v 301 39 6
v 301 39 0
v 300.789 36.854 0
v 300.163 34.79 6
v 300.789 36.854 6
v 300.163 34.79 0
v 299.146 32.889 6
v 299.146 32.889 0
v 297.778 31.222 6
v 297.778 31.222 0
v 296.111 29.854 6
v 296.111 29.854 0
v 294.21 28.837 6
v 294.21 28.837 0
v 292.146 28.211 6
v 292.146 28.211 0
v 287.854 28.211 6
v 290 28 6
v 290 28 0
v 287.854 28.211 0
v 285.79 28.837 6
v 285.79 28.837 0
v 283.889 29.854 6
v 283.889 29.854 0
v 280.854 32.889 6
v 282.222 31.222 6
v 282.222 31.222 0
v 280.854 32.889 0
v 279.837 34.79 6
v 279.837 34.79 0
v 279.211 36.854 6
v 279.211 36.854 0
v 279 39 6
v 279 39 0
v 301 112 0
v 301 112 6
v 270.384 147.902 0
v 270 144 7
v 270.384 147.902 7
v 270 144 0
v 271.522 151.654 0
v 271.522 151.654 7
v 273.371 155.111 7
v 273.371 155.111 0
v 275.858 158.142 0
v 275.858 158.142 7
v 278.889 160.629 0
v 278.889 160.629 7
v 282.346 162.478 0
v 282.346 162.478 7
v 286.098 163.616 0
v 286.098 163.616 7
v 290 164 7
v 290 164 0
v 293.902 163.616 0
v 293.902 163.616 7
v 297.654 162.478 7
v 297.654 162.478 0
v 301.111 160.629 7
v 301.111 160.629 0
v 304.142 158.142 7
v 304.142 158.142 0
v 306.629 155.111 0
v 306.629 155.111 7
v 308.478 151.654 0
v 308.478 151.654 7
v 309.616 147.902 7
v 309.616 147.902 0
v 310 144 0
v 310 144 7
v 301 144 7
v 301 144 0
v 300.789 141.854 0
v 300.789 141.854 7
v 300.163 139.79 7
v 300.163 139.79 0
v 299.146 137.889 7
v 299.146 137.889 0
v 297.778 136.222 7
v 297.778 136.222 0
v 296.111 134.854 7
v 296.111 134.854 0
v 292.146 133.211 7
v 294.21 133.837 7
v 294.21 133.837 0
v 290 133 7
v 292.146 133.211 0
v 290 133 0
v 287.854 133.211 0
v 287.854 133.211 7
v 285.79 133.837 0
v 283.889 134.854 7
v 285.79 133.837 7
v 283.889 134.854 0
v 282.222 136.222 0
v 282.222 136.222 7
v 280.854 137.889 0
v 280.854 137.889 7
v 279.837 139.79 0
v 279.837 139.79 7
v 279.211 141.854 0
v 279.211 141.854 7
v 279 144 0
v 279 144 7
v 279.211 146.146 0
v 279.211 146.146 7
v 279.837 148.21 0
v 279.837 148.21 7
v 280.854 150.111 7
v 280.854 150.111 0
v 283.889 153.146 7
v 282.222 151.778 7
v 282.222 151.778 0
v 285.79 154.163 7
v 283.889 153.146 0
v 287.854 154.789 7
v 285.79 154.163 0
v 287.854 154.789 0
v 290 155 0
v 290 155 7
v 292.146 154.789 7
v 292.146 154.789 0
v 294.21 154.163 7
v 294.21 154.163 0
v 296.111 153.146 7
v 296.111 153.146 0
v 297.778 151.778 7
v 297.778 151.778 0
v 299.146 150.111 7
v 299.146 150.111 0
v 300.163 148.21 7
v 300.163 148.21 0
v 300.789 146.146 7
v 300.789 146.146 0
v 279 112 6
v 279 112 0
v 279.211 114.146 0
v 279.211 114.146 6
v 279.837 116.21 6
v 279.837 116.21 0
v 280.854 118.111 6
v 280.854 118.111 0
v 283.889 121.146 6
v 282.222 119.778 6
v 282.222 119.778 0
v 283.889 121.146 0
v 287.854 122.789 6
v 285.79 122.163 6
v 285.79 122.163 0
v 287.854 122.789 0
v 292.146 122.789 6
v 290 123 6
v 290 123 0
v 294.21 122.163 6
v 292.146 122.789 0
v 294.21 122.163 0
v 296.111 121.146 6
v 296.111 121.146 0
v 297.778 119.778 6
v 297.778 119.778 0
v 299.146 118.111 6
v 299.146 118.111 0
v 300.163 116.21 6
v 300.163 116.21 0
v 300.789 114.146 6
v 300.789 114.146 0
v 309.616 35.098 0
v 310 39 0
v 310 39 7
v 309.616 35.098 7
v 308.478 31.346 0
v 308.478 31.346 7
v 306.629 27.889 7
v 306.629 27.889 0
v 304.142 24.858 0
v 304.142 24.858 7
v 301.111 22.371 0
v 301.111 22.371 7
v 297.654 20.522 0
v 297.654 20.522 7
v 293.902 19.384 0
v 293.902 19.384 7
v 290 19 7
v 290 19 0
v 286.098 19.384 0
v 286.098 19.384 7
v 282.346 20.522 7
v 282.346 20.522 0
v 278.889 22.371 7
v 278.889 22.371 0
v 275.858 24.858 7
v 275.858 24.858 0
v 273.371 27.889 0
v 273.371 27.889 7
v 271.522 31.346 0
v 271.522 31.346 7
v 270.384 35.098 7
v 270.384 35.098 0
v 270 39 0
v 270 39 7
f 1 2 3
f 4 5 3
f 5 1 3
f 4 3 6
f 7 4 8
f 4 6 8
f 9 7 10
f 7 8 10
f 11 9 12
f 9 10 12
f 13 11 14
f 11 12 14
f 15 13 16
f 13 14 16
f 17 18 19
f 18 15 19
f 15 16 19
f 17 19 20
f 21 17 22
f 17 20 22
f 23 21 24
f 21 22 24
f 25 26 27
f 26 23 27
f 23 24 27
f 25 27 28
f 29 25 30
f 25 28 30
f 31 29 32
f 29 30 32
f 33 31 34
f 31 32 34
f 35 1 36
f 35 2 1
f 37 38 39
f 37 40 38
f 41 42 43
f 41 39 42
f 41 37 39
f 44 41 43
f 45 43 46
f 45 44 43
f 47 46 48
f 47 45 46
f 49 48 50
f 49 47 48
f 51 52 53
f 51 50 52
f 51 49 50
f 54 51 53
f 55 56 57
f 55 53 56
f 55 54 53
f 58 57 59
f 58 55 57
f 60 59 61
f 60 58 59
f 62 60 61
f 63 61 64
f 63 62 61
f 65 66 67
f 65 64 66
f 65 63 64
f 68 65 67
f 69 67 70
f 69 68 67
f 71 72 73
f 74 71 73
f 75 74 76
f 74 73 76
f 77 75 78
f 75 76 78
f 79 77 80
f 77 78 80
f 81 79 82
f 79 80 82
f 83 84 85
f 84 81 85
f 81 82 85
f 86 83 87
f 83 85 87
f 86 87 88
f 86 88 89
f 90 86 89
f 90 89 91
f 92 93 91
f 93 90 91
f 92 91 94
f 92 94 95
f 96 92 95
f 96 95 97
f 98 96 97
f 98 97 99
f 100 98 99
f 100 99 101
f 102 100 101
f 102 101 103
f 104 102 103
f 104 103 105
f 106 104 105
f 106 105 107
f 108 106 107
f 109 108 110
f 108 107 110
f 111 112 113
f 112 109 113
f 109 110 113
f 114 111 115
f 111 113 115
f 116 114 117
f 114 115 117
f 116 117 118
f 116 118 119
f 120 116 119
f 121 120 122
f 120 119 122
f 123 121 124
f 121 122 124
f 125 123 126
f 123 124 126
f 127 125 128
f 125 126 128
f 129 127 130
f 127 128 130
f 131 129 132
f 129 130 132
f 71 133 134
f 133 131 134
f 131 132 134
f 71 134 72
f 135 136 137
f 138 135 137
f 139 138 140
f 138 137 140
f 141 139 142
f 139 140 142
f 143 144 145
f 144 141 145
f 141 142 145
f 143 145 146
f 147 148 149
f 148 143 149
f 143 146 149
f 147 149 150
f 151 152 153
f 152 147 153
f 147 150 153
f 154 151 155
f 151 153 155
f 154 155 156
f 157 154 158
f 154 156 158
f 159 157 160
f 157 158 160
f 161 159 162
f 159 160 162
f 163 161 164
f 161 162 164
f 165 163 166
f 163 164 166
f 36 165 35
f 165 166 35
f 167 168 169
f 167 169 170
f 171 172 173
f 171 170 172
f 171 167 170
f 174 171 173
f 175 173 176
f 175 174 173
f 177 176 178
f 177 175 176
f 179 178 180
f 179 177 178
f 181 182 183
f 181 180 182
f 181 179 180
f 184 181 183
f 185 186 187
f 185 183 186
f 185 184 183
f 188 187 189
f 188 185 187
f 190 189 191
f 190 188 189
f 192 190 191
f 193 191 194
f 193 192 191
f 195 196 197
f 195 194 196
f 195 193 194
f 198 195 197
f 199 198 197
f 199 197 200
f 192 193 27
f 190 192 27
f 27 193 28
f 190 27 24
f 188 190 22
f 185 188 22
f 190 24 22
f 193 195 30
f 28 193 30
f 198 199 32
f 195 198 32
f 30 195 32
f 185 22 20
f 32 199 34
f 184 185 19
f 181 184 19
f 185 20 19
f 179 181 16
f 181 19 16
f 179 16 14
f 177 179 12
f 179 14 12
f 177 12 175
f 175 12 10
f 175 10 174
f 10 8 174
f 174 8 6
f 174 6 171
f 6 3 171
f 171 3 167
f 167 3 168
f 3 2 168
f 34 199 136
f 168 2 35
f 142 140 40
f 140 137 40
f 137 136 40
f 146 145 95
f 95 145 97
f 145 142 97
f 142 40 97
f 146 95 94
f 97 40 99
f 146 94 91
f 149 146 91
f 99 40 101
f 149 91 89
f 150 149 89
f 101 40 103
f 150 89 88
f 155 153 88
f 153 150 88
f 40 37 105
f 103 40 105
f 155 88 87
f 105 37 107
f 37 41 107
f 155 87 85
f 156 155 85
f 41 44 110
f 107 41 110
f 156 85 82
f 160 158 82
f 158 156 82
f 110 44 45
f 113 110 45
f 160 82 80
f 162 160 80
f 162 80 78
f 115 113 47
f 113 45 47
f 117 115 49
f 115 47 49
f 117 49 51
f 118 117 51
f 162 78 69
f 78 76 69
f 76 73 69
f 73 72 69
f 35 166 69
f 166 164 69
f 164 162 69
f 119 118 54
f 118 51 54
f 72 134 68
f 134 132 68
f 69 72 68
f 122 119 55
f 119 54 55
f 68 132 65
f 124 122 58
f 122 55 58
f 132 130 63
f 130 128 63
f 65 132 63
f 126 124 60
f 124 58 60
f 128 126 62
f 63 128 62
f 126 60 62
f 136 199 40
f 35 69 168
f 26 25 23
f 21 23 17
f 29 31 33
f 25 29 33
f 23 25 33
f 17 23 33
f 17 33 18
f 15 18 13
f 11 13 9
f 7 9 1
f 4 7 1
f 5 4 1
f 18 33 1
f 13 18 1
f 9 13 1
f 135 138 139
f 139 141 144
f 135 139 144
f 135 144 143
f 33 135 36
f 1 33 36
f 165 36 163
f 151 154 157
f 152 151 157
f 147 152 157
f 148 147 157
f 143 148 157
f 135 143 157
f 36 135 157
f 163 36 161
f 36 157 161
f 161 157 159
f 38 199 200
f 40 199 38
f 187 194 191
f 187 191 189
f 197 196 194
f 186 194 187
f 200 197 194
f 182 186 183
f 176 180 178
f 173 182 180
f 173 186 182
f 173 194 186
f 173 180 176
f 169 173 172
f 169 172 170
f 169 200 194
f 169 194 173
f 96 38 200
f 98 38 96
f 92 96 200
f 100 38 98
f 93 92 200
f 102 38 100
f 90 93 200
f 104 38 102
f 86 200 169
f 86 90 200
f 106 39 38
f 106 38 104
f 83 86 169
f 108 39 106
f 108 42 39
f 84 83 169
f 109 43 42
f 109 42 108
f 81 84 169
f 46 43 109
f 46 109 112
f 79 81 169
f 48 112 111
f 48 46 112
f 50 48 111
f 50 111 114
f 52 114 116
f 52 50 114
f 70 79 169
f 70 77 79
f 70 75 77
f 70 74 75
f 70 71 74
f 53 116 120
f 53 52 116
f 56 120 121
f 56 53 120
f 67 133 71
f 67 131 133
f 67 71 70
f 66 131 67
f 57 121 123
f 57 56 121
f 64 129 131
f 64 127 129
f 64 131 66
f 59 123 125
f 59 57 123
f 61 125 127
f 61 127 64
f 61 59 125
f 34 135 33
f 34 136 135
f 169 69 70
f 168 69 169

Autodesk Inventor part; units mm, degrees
ref_plane "YZ Plane" through (0, 0, 0) normal (1, 0, 0) x (0, 1, 0)
ref_plane "XZ Plane" through (0, 0, 0) normal (0, 1, 0) x (-1, 0, 0)
ref_plane "XY Plane" through (0, 0, 0) normal (0, 0, 1) x (1, 0, 0)
sketch "Sketch1" plane through (0, 0, 0) normal (0, 0, 1) x (1, 0, 0)
  line L0 (0, 0) -> (220, 0) construction
  line L1 (220, 0) -> (220, 9) construction
  line L2 (220, 9) -> (0, 9) construction
  line L3 (0, 9) -> (0, 0) construction
  line L4 (0, 9) -> (90.94, 295.0593) construction
  line L5 (129.06, 295.0593) -> (220, 9) construction
  circle A0 centre (110, 289) radius 11 construction
  line L6 (96.1101, 281.616) -> (103.5522, 305.0259) construction
  arc A1 (129.06, 295.0593) -> (90.94, 295.0593) centre (110, 289) ccw construction
  line L7 (99, 275.5567) -> (99, 269.1274) construction
  line L8 (110, 289) -> (110, 144) construction
  line L9 (130, 289) -> (130, 144) construction
  line L10 (90, 144) -> (90, 289) construction
  arc A2 (130, 289) -> (90, 289) centre (110, 289) ccw construction
  arc A3 (90, 144) -> (130, 144) centre (110, 144) ccw construction
  line L11 (290, 144) -> (290, 249) construction
  line L12 (310, 144) -> (310, 249) construction
  line L13 (270, 249) -> (270, 144) construction
  arc A4 (270, 144) -> (310, 144) centre (290, 144) ccw construction
  arc A5 (310, 249) -> (270, 249) centre (290, 249) ccw construction
  arc A6 (90, 289) -> (130, 289) centre (110, 289) ccw construction
  line L14 (98.9216, 269) -> (121.0784, 269) construction
  line L15 (209.0249, 269) -> (370.9751, 269) construction
  line L16 (209.0249, 144) -> (370.9751, 144) construction
  line L17 (290, 144) -> (290, 39) construction
  line L18 (310, 144) -> (310, 39)
  line L19 (270, 39) -> (270, 144)
  arc A7 (310, 144) -> (270, 144) centre (290, 144) ccw
  arc A8 (270, 39) -> (310, 39) centre (290, 39) ccw
  line L20 (209.0249, 19) -> (370.9751, 19) construction
  circle A9 centre (110, 289) radius 11 construction
  circle A10 centre (110, 144) radius 11 construction
  circle A11 centre (290, 144) radius 11
  circle A12 centre (290, 39) radius 11
  line L21 (290, 39) -> (290, 112) construction
  line L22 (301, 39) -> (301, 112)
  line L23 (279, 112) -> (279, 39)
  arc A13 (279, 39) -> (301, 39) centre (290, 39) ccw
  arc A14 (301, 112) -> (279, 112) centre (290, 112) ccw
  line L24 (290, 123) -> (290, 133) construction
  point P0 (110, 0)
  point P1 (110, 216.5)
  point P2 (110, 309)
  point P3 (290, 196.5)
  point P4 (110, 269)
  point P5 (110, 269)
  point P6 (290, 269)
  point P7 (290, 75.5)
  dimension "d18" = 22
  dimension "d0" = 9
  dimension "d1" = 220
  dimension "d2" = 22
  dimension "d3" = 280
  dimension "d4" = 9
  dimension "d7" = 40
  dimension "d8" = 40
  dimension "pendgap" = 0
  dimension "abovethefloor" = 10
  dimension "d11" = 105
  dimension "d12" = 145
  dimension "d14" = 22
  dimension "d19" = 22
  dimension "d20" = 50
  dimension "d23" = 10
extrude "Extrusion3" add sketch "Sketch1" along normal blind 7 contours L18 A8 L19 A7 | A12 | A12 L23 A14 L22
extrude "Extrusion4" cut sketch "Sketch1" along normal blind 6 contours A11 | A12 | A12 L23 A14 L22
properties part number "DBP-3-pendulum2"
